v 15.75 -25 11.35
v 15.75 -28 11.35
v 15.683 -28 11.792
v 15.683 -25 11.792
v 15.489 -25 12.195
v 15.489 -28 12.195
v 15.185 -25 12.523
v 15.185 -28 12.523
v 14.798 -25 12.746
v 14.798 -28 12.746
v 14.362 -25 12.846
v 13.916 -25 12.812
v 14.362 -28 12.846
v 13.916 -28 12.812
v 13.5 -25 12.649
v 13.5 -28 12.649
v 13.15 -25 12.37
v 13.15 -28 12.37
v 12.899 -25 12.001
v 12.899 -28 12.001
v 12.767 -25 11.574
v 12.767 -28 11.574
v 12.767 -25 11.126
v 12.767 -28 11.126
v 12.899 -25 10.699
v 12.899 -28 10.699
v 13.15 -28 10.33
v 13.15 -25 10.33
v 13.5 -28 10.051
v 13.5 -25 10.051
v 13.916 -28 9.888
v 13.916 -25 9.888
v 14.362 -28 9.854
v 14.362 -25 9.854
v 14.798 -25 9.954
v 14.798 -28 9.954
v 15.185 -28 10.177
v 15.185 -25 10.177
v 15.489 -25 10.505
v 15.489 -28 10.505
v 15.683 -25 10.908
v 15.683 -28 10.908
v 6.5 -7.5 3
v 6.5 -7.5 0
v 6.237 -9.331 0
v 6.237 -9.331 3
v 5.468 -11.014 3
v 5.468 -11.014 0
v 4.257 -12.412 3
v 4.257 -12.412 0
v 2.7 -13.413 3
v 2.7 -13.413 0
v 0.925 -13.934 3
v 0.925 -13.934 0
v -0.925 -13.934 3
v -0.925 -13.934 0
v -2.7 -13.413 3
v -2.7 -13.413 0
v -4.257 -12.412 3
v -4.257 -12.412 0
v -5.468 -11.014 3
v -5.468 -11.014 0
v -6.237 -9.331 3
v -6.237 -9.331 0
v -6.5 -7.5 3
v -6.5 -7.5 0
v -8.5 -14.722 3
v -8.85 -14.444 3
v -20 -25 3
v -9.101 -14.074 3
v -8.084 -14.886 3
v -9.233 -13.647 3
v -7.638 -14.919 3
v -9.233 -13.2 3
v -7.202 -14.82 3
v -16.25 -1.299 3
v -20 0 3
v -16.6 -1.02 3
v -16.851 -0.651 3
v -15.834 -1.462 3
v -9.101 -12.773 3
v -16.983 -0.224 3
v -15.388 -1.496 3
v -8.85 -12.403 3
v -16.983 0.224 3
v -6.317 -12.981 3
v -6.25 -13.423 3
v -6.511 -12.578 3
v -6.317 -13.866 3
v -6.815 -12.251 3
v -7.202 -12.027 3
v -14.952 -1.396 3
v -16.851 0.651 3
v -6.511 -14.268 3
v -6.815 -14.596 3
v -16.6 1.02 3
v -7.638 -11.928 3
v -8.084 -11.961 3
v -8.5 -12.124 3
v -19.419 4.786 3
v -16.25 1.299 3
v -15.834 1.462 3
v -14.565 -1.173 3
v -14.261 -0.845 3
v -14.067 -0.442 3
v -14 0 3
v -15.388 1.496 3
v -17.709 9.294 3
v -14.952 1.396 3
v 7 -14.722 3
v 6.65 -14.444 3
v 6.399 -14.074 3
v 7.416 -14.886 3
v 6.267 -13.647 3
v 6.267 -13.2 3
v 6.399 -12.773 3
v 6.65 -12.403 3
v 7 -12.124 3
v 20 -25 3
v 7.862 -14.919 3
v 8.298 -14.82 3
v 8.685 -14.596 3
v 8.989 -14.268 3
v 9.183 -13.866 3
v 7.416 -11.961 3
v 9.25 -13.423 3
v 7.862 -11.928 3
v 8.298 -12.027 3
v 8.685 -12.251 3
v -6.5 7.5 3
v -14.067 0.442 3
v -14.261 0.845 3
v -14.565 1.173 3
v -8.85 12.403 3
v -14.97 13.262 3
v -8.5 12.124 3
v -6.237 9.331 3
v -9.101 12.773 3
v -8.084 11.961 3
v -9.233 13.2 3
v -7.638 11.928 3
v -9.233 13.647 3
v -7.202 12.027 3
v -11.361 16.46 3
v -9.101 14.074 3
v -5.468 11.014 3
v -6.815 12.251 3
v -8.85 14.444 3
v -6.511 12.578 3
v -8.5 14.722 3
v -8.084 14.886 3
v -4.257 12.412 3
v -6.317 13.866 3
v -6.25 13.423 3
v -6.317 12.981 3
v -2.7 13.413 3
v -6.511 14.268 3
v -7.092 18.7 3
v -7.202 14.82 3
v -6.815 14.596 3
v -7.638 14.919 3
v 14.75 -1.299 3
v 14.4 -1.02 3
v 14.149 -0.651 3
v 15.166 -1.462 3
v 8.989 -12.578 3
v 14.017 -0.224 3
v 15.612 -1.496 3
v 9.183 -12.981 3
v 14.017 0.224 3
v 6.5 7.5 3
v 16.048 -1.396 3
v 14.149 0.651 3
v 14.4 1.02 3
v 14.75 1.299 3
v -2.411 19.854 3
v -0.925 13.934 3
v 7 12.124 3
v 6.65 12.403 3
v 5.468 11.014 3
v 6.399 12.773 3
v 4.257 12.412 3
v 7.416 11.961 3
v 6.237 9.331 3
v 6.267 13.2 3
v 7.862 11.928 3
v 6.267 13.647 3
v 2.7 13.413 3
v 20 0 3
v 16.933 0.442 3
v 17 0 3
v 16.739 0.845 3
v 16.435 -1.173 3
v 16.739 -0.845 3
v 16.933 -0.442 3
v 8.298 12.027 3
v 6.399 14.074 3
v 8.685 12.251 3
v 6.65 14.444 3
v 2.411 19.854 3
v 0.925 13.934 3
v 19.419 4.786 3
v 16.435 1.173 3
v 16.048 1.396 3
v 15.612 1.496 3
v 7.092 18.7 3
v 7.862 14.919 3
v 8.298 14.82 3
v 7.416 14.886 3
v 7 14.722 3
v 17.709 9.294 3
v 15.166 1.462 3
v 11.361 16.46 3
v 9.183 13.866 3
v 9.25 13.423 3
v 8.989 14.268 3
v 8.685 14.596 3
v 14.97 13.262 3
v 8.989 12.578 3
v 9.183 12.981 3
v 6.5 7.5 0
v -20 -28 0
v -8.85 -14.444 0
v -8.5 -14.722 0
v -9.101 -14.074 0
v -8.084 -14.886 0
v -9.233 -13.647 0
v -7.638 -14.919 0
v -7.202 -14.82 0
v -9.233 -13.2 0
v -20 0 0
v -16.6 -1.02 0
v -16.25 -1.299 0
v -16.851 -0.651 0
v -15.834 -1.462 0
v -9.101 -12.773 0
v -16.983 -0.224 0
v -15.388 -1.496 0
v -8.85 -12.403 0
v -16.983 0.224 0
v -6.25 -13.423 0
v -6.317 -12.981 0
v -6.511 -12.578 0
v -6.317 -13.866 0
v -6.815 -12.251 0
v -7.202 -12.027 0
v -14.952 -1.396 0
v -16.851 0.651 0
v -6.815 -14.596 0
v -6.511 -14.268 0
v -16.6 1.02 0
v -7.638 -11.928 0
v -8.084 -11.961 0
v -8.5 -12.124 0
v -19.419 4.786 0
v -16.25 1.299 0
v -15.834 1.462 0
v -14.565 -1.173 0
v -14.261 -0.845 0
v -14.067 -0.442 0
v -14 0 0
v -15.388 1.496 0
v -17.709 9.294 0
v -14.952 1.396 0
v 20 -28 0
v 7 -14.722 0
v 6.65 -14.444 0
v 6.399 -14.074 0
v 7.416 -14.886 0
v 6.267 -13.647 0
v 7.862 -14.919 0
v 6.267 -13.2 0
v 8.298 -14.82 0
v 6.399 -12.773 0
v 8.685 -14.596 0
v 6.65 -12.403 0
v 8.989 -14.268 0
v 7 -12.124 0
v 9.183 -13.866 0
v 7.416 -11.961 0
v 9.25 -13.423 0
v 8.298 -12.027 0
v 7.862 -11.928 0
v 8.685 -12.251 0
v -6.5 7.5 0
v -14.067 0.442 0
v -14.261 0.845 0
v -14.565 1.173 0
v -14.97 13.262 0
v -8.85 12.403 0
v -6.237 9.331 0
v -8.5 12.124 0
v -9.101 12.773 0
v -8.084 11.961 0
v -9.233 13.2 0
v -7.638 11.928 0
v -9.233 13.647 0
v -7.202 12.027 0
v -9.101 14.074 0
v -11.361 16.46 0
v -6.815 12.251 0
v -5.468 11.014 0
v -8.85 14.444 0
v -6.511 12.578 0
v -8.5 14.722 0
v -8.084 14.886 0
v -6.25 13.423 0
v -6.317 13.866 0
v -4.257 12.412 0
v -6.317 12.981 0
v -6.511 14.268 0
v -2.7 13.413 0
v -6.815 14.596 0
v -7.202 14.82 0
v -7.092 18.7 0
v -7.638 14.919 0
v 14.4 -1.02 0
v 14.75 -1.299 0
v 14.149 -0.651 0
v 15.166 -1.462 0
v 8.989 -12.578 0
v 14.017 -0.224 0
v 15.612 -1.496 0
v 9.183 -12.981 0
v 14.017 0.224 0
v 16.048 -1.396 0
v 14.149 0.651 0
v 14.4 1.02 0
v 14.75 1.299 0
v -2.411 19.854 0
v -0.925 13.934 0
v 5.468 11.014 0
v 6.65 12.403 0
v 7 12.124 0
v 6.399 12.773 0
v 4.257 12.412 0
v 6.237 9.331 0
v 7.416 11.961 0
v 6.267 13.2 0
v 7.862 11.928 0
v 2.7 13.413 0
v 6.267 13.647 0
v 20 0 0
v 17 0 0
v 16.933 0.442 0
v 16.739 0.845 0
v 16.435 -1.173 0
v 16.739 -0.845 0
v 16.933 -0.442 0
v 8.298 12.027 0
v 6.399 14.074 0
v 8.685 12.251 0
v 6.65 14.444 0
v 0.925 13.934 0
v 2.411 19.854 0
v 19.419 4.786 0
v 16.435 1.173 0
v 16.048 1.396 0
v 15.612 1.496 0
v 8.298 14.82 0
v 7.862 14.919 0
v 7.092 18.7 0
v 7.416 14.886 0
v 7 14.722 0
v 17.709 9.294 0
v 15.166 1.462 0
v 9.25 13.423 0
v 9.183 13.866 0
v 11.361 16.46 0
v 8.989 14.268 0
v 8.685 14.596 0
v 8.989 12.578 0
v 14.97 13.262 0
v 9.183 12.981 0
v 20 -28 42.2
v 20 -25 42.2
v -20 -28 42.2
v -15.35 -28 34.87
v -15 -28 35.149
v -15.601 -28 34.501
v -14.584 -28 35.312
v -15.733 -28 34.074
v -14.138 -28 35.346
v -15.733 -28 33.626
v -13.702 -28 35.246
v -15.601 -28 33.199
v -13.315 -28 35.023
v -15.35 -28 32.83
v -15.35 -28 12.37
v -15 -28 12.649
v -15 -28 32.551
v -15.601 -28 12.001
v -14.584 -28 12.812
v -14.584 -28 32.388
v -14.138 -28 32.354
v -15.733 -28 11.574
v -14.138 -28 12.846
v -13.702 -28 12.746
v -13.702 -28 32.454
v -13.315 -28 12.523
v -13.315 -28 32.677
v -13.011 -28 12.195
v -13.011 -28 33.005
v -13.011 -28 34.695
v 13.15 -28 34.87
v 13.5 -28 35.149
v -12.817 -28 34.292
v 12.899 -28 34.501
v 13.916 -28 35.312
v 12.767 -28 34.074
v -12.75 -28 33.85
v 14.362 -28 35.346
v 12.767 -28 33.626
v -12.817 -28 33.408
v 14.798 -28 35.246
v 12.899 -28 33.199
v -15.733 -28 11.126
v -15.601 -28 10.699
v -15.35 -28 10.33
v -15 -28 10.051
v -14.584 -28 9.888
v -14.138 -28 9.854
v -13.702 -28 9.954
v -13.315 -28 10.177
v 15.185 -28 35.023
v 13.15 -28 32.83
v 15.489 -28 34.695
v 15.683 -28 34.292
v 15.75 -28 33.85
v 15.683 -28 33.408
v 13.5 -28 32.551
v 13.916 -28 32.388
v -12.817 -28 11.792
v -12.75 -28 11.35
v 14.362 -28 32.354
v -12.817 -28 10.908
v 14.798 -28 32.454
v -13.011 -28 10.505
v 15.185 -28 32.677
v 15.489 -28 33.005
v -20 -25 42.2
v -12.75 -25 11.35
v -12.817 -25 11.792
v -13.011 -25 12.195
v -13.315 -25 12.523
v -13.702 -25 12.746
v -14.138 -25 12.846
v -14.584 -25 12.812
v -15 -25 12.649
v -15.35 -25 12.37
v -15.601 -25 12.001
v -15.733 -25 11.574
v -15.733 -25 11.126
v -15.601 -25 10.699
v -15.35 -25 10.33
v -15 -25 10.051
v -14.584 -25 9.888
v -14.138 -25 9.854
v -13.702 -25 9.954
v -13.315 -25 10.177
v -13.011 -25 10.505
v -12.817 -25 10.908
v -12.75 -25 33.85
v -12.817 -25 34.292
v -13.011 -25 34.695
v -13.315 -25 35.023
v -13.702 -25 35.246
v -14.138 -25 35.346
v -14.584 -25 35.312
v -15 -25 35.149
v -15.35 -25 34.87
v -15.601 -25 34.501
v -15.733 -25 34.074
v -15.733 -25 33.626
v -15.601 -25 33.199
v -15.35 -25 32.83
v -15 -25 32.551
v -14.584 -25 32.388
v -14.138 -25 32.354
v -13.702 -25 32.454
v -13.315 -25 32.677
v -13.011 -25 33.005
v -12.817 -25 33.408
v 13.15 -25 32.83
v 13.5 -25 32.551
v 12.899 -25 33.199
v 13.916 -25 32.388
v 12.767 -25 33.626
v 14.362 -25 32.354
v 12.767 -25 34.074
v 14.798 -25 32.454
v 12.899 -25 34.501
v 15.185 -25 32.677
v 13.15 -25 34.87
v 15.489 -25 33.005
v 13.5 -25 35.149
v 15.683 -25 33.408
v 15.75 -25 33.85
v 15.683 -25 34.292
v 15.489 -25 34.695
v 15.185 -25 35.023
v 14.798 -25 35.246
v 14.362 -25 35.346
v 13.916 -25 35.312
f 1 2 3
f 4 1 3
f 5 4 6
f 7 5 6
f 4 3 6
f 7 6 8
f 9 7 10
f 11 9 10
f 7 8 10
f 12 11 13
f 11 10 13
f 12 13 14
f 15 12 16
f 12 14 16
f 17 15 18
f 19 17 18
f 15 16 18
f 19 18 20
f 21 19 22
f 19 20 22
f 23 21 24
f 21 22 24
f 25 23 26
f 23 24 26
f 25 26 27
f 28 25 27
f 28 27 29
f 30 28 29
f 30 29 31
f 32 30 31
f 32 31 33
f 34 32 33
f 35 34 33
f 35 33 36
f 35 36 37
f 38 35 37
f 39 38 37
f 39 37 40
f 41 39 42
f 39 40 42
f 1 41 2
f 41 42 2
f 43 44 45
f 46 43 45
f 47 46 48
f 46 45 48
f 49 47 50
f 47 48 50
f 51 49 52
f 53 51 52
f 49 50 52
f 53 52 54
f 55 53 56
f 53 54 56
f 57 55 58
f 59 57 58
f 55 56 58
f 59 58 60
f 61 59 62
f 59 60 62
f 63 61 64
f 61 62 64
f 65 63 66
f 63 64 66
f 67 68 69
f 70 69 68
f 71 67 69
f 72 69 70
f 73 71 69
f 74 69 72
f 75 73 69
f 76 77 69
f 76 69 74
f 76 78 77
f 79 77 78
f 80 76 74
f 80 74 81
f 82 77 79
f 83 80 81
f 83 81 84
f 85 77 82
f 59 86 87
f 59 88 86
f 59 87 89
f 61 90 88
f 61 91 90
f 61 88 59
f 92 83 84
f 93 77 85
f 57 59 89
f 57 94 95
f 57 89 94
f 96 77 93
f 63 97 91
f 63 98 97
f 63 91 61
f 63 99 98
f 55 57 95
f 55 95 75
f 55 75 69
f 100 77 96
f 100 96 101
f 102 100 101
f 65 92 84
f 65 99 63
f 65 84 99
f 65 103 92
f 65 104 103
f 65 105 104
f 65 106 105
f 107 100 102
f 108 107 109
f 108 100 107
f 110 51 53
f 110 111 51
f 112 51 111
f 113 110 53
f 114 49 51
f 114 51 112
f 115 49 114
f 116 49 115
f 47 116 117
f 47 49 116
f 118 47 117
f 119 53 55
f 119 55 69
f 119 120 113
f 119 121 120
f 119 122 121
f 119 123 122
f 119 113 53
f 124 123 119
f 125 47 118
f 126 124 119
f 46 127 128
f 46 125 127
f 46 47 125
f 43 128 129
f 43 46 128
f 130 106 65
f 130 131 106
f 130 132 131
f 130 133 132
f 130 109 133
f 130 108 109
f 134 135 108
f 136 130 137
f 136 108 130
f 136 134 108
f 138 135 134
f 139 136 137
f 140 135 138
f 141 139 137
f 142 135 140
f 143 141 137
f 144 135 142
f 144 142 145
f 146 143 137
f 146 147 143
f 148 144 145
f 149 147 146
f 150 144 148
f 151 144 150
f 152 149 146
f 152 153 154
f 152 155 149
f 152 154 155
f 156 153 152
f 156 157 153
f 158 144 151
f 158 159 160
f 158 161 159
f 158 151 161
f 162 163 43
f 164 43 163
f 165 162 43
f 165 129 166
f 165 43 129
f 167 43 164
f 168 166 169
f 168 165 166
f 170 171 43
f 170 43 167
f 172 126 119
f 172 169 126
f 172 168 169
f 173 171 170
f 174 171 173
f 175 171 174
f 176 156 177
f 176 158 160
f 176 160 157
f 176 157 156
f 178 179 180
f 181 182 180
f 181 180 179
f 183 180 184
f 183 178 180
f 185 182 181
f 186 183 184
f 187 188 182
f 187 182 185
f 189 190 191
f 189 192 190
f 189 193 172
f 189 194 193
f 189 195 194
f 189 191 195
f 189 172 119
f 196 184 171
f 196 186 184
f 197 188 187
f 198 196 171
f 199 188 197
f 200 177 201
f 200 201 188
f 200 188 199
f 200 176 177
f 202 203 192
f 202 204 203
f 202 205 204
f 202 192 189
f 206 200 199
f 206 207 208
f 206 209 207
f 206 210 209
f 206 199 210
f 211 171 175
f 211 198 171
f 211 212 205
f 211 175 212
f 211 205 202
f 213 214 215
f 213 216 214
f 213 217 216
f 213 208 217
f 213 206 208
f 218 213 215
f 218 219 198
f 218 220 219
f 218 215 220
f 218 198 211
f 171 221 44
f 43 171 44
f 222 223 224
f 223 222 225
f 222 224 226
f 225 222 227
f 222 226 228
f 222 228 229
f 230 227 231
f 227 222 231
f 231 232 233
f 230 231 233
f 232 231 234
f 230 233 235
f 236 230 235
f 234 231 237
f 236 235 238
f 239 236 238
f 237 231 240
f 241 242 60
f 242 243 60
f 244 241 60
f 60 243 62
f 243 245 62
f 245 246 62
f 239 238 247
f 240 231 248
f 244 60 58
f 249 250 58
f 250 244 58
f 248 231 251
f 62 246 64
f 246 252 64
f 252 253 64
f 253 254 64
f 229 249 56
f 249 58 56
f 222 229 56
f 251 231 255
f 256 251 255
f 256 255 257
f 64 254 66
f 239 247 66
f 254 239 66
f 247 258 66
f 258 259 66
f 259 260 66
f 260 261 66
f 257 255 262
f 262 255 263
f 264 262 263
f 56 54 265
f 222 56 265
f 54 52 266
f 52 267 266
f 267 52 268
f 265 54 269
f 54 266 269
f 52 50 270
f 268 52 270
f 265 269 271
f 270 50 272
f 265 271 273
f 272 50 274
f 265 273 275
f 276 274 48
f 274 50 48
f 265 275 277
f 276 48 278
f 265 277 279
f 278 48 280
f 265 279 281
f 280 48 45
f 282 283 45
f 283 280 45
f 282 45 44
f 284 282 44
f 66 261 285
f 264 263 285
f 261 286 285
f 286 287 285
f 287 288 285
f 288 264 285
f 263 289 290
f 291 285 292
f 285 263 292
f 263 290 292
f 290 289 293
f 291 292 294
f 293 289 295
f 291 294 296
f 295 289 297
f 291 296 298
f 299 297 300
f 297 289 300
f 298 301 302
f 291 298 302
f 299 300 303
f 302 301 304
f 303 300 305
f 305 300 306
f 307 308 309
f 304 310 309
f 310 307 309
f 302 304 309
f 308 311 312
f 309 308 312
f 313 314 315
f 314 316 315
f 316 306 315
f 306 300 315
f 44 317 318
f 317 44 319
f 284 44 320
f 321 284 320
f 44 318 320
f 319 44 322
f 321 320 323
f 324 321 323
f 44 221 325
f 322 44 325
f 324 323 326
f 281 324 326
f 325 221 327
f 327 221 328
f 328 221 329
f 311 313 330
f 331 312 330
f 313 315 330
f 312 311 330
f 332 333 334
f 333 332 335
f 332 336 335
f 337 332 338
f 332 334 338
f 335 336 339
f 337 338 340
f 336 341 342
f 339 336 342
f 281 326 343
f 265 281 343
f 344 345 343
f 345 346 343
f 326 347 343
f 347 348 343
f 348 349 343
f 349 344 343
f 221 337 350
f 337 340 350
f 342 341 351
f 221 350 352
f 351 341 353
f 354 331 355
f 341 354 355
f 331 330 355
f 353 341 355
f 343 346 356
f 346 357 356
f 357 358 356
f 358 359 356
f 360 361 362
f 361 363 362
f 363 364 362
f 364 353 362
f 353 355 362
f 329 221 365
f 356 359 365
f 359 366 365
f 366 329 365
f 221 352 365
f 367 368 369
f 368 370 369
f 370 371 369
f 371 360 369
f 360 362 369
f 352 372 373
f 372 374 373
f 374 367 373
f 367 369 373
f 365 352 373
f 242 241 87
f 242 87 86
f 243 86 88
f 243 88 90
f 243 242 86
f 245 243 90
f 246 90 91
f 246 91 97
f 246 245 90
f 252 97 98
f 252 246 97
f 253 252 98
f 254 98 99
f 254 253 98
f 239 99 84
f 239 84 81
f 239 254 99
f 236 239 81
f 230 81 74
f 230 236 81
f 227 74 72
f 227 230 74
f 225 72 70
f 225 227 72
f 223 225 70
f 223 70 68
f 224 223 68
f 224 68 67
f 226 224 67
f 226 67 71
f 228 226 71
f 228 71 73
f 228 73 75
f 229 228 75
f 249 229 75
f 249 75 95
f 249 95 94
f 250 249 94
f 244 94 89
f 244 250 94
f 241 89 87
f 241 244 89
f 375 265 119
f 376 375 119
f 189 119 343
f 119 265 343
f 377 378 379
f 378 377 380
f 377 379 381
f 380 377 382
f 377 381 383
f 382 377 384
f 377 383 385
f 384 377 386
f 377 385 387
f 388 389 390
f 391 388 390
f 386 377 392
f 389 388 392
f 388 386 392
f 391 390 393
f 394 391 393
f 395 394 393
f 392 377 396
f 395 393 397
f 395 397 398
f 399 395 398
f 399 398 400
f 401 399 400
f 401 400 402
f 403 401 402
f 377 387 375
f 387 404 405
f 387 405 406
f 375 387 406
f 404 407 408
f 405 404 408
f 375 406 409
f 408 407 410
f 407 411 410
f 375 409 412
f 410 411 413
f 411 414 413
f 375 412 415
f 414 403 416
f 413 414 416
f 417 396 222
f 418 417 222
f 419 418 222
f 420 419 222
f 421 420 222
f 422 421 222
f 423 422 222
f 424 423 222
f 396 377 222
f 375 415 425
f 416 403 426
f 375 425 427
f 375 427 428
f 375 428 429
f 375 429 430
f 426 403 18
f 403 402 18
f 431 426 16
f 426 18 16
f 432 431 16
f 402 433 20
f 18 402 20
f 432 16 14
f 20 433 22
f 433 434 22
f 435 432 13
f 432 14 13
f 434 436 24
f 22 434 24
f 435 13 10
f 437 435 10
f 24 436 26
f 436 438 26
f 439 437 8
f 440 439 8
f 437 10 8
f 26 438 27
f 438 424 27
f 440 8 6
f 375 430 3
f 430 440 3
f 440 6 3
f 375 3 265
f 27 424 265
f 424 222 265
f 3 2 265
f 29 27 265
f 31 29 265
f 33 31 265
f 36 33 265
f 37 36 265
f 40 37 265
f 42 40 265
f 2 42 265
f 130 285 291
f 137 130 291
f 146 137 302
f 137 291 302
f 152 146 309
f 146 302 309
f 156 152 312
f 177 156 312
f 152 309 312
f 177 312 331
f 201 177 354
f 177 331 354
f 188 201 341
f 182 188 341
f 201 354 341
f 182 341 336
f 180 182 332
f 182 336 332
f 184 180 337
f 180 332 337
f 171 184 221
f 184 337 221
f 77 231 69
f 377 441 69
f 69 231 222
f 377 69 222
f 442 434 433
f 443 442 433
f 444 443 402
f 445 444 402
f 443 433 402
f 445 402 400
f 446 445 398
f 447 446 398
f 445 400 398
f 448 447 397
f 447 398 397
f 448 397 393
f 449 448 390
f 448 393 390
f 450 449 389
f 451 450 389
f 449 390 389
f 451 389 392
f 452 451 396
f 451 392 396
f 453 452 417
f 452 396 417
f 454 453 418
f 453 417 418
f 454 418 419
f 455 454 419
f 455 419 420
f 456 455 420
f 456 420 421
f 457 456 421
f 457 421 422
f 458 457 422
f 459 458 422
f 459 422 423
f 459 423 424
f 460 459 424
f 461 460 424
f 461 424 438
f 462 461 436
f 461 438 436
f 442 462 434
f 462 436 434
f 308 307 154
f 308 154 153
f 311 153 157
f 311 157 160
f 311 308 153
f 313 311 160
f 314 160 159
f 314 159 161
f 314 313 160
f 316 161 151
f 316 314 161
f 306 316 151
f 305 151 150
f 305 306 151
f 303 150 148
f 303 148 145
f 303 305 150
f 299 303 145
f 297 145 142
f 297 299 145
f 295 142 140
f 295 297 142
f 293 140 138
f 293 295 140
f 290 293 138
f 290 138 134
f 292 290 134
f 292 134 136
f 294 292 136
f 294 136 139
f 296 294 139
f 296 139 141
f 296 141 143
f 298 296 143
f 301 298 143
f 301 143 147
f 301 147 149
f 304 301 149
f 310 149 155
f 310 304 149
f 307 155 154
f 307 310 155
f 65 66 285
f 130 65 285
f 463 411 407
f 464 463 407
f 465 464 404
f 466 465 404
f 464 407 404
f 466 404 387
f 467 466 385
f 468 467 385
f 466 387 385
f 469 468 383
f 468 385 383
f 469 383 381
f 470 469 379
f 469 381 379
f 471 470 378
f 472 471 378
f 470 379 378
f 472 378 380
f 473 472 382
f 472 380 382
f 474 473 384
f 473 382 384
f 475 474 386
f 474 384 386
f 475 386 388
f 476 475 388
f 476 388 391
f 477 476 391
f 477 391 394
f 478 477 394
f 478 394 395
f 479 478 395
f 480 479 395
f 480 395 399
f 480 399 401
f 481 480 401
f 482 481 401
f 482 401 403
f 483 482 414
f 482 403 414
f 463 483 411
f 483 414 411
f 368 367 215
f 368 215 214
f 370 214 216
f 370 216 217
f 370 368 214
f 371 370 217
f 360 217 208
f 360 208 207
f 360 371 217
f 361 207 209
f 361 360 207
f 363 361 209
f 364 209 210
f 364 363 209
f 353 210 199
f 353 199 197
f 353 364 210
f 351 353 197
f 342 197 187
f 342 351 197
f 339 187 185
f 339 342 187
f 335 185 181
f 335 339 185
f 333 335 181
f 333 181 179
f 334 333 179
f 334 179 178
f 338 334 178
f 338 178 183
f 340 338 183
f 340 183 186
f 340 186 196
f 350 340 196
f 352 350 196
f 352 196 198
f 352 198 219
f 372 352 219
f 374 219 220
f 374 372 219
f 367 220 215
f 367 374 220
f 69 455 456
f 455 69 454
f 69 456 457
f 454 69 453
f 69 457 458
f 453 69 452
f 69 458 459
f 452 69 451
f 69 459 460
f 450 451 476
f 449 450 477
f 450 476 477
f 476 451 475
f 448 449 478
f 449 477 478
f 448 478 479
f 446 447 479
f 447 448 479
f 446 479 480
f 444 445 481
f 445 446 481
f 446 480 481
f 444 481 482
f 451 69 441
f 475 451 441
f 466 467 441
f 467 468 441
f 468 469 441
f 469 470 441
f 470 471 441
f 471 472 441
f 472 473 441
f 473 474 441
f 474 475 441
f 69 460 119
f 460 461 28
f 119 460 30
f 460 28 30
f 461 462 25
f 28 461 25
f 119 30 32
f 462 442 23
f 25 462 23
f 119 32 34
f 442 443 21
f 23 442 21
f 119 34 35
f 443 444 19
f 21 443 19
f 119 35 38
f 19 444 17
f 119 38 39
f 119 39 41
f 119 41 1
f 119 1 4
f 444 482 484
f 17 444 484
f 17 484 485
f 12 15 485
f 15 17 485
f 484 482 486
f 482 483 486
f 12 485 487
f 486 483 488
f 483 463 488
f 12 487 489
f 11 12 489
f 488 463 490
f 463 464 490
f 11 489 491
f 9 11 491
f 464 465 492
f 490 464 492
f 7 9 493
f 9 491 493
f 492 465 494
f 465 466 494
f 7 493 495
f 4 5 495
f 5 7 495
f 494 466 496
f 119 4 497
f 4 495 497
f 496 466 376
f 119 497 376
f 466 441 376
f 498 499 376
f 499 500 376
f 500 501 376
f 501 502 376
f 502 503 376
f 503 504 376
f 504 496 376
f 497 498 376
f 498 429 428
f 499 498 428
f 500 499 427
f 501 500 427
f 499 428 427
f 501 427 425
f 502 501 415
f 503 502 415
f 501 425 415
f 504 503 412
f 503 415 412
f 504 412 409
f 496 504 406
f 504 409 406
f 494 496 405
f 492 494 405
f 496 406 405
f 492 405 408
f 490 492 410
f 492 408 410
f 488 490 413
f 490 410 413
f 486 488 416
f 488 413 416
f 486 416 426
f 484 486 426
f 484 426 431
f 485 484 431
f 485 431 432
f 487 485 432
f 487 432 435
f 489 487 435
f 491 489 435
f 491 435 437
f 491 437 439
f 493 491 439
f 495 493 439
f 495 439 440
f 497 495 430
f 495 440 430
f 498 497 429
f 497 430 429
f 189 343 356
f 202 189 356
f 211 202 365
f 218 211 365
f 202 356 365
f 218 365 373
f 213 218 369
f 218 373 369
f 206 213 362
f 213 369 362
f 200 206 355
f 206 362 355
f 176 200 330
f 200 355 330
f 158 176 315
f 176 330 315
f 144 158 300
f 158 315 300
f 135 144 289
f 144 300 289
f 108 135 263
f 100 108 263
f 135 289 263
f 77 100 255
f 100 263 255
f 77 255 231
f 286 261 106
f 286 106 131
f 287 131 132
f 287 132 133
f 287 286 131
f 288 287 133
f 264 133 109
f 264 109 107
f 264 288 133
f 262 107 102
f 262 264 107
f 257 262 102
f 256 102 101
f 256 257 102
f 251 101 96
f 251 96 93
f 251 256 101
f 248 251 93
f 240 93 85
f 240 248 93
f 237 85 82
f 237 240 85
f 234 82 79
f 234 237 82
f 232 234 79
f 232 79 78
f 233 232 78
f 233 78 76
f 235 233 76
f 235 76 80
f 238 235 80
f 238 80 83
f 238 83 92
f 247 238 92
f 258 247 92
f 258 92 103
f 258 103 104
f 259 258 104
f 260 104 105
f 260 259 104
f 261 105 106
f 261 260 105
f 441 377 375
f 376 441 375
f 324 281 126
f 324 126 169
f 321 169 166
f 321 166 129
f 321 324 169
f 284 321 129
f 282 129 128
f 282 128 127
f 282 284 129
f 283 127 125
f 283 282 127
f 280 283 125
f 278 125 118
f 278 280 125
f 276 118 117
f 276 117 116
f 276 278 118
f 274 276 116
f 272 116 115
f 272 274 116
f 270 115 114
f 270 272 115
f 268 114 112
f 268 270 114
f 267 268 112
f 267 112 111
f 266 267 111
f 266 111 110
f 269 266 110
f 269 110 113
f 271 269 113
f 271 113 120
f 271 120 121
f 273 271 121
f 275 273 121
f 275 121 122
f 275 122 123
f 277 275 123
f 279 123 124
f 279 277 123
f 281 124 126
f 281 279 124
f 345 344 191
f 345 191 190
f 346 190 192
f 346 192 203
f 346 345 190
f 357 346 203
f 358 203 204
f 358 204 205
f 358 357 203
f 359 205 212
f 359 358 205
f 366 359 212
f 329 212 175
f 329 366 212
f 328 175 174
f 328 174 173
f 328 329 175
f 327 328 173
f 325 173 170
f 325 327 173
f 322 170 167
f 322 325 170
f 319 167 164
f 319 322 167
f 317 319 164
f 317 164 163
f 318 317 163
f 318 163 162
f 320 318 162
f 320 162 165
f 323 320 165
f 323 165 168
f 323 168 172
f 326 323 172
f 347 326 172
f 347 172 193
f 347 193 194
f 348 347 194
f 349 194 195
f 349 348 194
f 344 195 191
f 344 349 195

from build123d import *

# Parameters (mm, degrees)
ESBO_O1_R                = 1.5
RESSALTO_EXTRUS_O1_DEPTH = 3
ESBO_O2_W                = 40
ESBO_O2_H                = 42.2
ESBO_O2_R                = 1.5
RESSALTO_EXTRUS_O2_DEPTH = 3


with BuildPart() as part:
    # Esboço1 → Ressalto-extrusão1 (new body)
    with BuildSketch(Plane.XY):
        with BuildLine():
            Line((-20, 0), (-20, -28))
            Line((-20, -28), (20, -28))
            Line((20, -28), (20, 0))
            ThreePointArc((20, 0), (0, 20), (-20, 0))
        make_face()
        with Locations((-15.5, 0)):
            Circle(ESBO_O1_R, mode=Mode.SUBTRACT)
        with Locations((-7.75, 13.423393759)):
            Circle(ESBO_O1_R, mode=Mode.SUBTRACT)
        with Locations((7.75, 13.423393759)):
            Circle(ESBO_O1_R, mode=Mode.SUBTRACT)
        with Locations((15.5, 0)):
            Circle(ESBO_O1_R, mode=Mode.SUBTRACT)
        with Locations((7.75, -13.423393759)):
            Circle(ESBO_O1_R, mode=Mode.SUBTRACT)
        with Locations((-7.75, -13.423393759)):
            Circle(ESBO_O1_R, mode=Mode.SUBTRACT)
        with BuildLine():
            Line((6.5, 7.5), (6.5, -7.5))
            ThreePointArc((6.5, -7.5), (0, -14), (-6.5, -7.5))
            Line((-6.5, -7.5), (-6.5, 7.5))
            ThreePointArc((-6.5, 7.5), (0, 14), (6.5, 7.5))
        make_face(mode=Mode.SUBTRACT)
    extrude(amount=RESSALTO_EXTRUS_O1_DEPTH)

    # Esboço2 → Ressalto-extrusão2 (add)
    with BuildSketch(Plane.XZ.offset(28)):
        with Locations((0, 21.1)):
            Rectangle(ESBO_O2_W, ESBO_O2_H)
        with Locations((-14.25, 11.35)):
            Circle(ESBO_O2_R, mode=Mode.SUBTRACT)
        with Locations((14.25, 11.35)):
            Circle(ESBO_O2_R, mode=Mode.SUBTRACT)
        with Locations((14.25, 33.85)):
            Circle(ESBO_O2_R, mode=Mode.SUBTRACT)
        with Locations((-14.25, 33.85)):
            Circle(ESBO_O2_R, mode=Mode.SUBTRACT)
    extrude(amount=-RESSALTO_EXTRUS_O2_DEPTH)


solid = part.part
